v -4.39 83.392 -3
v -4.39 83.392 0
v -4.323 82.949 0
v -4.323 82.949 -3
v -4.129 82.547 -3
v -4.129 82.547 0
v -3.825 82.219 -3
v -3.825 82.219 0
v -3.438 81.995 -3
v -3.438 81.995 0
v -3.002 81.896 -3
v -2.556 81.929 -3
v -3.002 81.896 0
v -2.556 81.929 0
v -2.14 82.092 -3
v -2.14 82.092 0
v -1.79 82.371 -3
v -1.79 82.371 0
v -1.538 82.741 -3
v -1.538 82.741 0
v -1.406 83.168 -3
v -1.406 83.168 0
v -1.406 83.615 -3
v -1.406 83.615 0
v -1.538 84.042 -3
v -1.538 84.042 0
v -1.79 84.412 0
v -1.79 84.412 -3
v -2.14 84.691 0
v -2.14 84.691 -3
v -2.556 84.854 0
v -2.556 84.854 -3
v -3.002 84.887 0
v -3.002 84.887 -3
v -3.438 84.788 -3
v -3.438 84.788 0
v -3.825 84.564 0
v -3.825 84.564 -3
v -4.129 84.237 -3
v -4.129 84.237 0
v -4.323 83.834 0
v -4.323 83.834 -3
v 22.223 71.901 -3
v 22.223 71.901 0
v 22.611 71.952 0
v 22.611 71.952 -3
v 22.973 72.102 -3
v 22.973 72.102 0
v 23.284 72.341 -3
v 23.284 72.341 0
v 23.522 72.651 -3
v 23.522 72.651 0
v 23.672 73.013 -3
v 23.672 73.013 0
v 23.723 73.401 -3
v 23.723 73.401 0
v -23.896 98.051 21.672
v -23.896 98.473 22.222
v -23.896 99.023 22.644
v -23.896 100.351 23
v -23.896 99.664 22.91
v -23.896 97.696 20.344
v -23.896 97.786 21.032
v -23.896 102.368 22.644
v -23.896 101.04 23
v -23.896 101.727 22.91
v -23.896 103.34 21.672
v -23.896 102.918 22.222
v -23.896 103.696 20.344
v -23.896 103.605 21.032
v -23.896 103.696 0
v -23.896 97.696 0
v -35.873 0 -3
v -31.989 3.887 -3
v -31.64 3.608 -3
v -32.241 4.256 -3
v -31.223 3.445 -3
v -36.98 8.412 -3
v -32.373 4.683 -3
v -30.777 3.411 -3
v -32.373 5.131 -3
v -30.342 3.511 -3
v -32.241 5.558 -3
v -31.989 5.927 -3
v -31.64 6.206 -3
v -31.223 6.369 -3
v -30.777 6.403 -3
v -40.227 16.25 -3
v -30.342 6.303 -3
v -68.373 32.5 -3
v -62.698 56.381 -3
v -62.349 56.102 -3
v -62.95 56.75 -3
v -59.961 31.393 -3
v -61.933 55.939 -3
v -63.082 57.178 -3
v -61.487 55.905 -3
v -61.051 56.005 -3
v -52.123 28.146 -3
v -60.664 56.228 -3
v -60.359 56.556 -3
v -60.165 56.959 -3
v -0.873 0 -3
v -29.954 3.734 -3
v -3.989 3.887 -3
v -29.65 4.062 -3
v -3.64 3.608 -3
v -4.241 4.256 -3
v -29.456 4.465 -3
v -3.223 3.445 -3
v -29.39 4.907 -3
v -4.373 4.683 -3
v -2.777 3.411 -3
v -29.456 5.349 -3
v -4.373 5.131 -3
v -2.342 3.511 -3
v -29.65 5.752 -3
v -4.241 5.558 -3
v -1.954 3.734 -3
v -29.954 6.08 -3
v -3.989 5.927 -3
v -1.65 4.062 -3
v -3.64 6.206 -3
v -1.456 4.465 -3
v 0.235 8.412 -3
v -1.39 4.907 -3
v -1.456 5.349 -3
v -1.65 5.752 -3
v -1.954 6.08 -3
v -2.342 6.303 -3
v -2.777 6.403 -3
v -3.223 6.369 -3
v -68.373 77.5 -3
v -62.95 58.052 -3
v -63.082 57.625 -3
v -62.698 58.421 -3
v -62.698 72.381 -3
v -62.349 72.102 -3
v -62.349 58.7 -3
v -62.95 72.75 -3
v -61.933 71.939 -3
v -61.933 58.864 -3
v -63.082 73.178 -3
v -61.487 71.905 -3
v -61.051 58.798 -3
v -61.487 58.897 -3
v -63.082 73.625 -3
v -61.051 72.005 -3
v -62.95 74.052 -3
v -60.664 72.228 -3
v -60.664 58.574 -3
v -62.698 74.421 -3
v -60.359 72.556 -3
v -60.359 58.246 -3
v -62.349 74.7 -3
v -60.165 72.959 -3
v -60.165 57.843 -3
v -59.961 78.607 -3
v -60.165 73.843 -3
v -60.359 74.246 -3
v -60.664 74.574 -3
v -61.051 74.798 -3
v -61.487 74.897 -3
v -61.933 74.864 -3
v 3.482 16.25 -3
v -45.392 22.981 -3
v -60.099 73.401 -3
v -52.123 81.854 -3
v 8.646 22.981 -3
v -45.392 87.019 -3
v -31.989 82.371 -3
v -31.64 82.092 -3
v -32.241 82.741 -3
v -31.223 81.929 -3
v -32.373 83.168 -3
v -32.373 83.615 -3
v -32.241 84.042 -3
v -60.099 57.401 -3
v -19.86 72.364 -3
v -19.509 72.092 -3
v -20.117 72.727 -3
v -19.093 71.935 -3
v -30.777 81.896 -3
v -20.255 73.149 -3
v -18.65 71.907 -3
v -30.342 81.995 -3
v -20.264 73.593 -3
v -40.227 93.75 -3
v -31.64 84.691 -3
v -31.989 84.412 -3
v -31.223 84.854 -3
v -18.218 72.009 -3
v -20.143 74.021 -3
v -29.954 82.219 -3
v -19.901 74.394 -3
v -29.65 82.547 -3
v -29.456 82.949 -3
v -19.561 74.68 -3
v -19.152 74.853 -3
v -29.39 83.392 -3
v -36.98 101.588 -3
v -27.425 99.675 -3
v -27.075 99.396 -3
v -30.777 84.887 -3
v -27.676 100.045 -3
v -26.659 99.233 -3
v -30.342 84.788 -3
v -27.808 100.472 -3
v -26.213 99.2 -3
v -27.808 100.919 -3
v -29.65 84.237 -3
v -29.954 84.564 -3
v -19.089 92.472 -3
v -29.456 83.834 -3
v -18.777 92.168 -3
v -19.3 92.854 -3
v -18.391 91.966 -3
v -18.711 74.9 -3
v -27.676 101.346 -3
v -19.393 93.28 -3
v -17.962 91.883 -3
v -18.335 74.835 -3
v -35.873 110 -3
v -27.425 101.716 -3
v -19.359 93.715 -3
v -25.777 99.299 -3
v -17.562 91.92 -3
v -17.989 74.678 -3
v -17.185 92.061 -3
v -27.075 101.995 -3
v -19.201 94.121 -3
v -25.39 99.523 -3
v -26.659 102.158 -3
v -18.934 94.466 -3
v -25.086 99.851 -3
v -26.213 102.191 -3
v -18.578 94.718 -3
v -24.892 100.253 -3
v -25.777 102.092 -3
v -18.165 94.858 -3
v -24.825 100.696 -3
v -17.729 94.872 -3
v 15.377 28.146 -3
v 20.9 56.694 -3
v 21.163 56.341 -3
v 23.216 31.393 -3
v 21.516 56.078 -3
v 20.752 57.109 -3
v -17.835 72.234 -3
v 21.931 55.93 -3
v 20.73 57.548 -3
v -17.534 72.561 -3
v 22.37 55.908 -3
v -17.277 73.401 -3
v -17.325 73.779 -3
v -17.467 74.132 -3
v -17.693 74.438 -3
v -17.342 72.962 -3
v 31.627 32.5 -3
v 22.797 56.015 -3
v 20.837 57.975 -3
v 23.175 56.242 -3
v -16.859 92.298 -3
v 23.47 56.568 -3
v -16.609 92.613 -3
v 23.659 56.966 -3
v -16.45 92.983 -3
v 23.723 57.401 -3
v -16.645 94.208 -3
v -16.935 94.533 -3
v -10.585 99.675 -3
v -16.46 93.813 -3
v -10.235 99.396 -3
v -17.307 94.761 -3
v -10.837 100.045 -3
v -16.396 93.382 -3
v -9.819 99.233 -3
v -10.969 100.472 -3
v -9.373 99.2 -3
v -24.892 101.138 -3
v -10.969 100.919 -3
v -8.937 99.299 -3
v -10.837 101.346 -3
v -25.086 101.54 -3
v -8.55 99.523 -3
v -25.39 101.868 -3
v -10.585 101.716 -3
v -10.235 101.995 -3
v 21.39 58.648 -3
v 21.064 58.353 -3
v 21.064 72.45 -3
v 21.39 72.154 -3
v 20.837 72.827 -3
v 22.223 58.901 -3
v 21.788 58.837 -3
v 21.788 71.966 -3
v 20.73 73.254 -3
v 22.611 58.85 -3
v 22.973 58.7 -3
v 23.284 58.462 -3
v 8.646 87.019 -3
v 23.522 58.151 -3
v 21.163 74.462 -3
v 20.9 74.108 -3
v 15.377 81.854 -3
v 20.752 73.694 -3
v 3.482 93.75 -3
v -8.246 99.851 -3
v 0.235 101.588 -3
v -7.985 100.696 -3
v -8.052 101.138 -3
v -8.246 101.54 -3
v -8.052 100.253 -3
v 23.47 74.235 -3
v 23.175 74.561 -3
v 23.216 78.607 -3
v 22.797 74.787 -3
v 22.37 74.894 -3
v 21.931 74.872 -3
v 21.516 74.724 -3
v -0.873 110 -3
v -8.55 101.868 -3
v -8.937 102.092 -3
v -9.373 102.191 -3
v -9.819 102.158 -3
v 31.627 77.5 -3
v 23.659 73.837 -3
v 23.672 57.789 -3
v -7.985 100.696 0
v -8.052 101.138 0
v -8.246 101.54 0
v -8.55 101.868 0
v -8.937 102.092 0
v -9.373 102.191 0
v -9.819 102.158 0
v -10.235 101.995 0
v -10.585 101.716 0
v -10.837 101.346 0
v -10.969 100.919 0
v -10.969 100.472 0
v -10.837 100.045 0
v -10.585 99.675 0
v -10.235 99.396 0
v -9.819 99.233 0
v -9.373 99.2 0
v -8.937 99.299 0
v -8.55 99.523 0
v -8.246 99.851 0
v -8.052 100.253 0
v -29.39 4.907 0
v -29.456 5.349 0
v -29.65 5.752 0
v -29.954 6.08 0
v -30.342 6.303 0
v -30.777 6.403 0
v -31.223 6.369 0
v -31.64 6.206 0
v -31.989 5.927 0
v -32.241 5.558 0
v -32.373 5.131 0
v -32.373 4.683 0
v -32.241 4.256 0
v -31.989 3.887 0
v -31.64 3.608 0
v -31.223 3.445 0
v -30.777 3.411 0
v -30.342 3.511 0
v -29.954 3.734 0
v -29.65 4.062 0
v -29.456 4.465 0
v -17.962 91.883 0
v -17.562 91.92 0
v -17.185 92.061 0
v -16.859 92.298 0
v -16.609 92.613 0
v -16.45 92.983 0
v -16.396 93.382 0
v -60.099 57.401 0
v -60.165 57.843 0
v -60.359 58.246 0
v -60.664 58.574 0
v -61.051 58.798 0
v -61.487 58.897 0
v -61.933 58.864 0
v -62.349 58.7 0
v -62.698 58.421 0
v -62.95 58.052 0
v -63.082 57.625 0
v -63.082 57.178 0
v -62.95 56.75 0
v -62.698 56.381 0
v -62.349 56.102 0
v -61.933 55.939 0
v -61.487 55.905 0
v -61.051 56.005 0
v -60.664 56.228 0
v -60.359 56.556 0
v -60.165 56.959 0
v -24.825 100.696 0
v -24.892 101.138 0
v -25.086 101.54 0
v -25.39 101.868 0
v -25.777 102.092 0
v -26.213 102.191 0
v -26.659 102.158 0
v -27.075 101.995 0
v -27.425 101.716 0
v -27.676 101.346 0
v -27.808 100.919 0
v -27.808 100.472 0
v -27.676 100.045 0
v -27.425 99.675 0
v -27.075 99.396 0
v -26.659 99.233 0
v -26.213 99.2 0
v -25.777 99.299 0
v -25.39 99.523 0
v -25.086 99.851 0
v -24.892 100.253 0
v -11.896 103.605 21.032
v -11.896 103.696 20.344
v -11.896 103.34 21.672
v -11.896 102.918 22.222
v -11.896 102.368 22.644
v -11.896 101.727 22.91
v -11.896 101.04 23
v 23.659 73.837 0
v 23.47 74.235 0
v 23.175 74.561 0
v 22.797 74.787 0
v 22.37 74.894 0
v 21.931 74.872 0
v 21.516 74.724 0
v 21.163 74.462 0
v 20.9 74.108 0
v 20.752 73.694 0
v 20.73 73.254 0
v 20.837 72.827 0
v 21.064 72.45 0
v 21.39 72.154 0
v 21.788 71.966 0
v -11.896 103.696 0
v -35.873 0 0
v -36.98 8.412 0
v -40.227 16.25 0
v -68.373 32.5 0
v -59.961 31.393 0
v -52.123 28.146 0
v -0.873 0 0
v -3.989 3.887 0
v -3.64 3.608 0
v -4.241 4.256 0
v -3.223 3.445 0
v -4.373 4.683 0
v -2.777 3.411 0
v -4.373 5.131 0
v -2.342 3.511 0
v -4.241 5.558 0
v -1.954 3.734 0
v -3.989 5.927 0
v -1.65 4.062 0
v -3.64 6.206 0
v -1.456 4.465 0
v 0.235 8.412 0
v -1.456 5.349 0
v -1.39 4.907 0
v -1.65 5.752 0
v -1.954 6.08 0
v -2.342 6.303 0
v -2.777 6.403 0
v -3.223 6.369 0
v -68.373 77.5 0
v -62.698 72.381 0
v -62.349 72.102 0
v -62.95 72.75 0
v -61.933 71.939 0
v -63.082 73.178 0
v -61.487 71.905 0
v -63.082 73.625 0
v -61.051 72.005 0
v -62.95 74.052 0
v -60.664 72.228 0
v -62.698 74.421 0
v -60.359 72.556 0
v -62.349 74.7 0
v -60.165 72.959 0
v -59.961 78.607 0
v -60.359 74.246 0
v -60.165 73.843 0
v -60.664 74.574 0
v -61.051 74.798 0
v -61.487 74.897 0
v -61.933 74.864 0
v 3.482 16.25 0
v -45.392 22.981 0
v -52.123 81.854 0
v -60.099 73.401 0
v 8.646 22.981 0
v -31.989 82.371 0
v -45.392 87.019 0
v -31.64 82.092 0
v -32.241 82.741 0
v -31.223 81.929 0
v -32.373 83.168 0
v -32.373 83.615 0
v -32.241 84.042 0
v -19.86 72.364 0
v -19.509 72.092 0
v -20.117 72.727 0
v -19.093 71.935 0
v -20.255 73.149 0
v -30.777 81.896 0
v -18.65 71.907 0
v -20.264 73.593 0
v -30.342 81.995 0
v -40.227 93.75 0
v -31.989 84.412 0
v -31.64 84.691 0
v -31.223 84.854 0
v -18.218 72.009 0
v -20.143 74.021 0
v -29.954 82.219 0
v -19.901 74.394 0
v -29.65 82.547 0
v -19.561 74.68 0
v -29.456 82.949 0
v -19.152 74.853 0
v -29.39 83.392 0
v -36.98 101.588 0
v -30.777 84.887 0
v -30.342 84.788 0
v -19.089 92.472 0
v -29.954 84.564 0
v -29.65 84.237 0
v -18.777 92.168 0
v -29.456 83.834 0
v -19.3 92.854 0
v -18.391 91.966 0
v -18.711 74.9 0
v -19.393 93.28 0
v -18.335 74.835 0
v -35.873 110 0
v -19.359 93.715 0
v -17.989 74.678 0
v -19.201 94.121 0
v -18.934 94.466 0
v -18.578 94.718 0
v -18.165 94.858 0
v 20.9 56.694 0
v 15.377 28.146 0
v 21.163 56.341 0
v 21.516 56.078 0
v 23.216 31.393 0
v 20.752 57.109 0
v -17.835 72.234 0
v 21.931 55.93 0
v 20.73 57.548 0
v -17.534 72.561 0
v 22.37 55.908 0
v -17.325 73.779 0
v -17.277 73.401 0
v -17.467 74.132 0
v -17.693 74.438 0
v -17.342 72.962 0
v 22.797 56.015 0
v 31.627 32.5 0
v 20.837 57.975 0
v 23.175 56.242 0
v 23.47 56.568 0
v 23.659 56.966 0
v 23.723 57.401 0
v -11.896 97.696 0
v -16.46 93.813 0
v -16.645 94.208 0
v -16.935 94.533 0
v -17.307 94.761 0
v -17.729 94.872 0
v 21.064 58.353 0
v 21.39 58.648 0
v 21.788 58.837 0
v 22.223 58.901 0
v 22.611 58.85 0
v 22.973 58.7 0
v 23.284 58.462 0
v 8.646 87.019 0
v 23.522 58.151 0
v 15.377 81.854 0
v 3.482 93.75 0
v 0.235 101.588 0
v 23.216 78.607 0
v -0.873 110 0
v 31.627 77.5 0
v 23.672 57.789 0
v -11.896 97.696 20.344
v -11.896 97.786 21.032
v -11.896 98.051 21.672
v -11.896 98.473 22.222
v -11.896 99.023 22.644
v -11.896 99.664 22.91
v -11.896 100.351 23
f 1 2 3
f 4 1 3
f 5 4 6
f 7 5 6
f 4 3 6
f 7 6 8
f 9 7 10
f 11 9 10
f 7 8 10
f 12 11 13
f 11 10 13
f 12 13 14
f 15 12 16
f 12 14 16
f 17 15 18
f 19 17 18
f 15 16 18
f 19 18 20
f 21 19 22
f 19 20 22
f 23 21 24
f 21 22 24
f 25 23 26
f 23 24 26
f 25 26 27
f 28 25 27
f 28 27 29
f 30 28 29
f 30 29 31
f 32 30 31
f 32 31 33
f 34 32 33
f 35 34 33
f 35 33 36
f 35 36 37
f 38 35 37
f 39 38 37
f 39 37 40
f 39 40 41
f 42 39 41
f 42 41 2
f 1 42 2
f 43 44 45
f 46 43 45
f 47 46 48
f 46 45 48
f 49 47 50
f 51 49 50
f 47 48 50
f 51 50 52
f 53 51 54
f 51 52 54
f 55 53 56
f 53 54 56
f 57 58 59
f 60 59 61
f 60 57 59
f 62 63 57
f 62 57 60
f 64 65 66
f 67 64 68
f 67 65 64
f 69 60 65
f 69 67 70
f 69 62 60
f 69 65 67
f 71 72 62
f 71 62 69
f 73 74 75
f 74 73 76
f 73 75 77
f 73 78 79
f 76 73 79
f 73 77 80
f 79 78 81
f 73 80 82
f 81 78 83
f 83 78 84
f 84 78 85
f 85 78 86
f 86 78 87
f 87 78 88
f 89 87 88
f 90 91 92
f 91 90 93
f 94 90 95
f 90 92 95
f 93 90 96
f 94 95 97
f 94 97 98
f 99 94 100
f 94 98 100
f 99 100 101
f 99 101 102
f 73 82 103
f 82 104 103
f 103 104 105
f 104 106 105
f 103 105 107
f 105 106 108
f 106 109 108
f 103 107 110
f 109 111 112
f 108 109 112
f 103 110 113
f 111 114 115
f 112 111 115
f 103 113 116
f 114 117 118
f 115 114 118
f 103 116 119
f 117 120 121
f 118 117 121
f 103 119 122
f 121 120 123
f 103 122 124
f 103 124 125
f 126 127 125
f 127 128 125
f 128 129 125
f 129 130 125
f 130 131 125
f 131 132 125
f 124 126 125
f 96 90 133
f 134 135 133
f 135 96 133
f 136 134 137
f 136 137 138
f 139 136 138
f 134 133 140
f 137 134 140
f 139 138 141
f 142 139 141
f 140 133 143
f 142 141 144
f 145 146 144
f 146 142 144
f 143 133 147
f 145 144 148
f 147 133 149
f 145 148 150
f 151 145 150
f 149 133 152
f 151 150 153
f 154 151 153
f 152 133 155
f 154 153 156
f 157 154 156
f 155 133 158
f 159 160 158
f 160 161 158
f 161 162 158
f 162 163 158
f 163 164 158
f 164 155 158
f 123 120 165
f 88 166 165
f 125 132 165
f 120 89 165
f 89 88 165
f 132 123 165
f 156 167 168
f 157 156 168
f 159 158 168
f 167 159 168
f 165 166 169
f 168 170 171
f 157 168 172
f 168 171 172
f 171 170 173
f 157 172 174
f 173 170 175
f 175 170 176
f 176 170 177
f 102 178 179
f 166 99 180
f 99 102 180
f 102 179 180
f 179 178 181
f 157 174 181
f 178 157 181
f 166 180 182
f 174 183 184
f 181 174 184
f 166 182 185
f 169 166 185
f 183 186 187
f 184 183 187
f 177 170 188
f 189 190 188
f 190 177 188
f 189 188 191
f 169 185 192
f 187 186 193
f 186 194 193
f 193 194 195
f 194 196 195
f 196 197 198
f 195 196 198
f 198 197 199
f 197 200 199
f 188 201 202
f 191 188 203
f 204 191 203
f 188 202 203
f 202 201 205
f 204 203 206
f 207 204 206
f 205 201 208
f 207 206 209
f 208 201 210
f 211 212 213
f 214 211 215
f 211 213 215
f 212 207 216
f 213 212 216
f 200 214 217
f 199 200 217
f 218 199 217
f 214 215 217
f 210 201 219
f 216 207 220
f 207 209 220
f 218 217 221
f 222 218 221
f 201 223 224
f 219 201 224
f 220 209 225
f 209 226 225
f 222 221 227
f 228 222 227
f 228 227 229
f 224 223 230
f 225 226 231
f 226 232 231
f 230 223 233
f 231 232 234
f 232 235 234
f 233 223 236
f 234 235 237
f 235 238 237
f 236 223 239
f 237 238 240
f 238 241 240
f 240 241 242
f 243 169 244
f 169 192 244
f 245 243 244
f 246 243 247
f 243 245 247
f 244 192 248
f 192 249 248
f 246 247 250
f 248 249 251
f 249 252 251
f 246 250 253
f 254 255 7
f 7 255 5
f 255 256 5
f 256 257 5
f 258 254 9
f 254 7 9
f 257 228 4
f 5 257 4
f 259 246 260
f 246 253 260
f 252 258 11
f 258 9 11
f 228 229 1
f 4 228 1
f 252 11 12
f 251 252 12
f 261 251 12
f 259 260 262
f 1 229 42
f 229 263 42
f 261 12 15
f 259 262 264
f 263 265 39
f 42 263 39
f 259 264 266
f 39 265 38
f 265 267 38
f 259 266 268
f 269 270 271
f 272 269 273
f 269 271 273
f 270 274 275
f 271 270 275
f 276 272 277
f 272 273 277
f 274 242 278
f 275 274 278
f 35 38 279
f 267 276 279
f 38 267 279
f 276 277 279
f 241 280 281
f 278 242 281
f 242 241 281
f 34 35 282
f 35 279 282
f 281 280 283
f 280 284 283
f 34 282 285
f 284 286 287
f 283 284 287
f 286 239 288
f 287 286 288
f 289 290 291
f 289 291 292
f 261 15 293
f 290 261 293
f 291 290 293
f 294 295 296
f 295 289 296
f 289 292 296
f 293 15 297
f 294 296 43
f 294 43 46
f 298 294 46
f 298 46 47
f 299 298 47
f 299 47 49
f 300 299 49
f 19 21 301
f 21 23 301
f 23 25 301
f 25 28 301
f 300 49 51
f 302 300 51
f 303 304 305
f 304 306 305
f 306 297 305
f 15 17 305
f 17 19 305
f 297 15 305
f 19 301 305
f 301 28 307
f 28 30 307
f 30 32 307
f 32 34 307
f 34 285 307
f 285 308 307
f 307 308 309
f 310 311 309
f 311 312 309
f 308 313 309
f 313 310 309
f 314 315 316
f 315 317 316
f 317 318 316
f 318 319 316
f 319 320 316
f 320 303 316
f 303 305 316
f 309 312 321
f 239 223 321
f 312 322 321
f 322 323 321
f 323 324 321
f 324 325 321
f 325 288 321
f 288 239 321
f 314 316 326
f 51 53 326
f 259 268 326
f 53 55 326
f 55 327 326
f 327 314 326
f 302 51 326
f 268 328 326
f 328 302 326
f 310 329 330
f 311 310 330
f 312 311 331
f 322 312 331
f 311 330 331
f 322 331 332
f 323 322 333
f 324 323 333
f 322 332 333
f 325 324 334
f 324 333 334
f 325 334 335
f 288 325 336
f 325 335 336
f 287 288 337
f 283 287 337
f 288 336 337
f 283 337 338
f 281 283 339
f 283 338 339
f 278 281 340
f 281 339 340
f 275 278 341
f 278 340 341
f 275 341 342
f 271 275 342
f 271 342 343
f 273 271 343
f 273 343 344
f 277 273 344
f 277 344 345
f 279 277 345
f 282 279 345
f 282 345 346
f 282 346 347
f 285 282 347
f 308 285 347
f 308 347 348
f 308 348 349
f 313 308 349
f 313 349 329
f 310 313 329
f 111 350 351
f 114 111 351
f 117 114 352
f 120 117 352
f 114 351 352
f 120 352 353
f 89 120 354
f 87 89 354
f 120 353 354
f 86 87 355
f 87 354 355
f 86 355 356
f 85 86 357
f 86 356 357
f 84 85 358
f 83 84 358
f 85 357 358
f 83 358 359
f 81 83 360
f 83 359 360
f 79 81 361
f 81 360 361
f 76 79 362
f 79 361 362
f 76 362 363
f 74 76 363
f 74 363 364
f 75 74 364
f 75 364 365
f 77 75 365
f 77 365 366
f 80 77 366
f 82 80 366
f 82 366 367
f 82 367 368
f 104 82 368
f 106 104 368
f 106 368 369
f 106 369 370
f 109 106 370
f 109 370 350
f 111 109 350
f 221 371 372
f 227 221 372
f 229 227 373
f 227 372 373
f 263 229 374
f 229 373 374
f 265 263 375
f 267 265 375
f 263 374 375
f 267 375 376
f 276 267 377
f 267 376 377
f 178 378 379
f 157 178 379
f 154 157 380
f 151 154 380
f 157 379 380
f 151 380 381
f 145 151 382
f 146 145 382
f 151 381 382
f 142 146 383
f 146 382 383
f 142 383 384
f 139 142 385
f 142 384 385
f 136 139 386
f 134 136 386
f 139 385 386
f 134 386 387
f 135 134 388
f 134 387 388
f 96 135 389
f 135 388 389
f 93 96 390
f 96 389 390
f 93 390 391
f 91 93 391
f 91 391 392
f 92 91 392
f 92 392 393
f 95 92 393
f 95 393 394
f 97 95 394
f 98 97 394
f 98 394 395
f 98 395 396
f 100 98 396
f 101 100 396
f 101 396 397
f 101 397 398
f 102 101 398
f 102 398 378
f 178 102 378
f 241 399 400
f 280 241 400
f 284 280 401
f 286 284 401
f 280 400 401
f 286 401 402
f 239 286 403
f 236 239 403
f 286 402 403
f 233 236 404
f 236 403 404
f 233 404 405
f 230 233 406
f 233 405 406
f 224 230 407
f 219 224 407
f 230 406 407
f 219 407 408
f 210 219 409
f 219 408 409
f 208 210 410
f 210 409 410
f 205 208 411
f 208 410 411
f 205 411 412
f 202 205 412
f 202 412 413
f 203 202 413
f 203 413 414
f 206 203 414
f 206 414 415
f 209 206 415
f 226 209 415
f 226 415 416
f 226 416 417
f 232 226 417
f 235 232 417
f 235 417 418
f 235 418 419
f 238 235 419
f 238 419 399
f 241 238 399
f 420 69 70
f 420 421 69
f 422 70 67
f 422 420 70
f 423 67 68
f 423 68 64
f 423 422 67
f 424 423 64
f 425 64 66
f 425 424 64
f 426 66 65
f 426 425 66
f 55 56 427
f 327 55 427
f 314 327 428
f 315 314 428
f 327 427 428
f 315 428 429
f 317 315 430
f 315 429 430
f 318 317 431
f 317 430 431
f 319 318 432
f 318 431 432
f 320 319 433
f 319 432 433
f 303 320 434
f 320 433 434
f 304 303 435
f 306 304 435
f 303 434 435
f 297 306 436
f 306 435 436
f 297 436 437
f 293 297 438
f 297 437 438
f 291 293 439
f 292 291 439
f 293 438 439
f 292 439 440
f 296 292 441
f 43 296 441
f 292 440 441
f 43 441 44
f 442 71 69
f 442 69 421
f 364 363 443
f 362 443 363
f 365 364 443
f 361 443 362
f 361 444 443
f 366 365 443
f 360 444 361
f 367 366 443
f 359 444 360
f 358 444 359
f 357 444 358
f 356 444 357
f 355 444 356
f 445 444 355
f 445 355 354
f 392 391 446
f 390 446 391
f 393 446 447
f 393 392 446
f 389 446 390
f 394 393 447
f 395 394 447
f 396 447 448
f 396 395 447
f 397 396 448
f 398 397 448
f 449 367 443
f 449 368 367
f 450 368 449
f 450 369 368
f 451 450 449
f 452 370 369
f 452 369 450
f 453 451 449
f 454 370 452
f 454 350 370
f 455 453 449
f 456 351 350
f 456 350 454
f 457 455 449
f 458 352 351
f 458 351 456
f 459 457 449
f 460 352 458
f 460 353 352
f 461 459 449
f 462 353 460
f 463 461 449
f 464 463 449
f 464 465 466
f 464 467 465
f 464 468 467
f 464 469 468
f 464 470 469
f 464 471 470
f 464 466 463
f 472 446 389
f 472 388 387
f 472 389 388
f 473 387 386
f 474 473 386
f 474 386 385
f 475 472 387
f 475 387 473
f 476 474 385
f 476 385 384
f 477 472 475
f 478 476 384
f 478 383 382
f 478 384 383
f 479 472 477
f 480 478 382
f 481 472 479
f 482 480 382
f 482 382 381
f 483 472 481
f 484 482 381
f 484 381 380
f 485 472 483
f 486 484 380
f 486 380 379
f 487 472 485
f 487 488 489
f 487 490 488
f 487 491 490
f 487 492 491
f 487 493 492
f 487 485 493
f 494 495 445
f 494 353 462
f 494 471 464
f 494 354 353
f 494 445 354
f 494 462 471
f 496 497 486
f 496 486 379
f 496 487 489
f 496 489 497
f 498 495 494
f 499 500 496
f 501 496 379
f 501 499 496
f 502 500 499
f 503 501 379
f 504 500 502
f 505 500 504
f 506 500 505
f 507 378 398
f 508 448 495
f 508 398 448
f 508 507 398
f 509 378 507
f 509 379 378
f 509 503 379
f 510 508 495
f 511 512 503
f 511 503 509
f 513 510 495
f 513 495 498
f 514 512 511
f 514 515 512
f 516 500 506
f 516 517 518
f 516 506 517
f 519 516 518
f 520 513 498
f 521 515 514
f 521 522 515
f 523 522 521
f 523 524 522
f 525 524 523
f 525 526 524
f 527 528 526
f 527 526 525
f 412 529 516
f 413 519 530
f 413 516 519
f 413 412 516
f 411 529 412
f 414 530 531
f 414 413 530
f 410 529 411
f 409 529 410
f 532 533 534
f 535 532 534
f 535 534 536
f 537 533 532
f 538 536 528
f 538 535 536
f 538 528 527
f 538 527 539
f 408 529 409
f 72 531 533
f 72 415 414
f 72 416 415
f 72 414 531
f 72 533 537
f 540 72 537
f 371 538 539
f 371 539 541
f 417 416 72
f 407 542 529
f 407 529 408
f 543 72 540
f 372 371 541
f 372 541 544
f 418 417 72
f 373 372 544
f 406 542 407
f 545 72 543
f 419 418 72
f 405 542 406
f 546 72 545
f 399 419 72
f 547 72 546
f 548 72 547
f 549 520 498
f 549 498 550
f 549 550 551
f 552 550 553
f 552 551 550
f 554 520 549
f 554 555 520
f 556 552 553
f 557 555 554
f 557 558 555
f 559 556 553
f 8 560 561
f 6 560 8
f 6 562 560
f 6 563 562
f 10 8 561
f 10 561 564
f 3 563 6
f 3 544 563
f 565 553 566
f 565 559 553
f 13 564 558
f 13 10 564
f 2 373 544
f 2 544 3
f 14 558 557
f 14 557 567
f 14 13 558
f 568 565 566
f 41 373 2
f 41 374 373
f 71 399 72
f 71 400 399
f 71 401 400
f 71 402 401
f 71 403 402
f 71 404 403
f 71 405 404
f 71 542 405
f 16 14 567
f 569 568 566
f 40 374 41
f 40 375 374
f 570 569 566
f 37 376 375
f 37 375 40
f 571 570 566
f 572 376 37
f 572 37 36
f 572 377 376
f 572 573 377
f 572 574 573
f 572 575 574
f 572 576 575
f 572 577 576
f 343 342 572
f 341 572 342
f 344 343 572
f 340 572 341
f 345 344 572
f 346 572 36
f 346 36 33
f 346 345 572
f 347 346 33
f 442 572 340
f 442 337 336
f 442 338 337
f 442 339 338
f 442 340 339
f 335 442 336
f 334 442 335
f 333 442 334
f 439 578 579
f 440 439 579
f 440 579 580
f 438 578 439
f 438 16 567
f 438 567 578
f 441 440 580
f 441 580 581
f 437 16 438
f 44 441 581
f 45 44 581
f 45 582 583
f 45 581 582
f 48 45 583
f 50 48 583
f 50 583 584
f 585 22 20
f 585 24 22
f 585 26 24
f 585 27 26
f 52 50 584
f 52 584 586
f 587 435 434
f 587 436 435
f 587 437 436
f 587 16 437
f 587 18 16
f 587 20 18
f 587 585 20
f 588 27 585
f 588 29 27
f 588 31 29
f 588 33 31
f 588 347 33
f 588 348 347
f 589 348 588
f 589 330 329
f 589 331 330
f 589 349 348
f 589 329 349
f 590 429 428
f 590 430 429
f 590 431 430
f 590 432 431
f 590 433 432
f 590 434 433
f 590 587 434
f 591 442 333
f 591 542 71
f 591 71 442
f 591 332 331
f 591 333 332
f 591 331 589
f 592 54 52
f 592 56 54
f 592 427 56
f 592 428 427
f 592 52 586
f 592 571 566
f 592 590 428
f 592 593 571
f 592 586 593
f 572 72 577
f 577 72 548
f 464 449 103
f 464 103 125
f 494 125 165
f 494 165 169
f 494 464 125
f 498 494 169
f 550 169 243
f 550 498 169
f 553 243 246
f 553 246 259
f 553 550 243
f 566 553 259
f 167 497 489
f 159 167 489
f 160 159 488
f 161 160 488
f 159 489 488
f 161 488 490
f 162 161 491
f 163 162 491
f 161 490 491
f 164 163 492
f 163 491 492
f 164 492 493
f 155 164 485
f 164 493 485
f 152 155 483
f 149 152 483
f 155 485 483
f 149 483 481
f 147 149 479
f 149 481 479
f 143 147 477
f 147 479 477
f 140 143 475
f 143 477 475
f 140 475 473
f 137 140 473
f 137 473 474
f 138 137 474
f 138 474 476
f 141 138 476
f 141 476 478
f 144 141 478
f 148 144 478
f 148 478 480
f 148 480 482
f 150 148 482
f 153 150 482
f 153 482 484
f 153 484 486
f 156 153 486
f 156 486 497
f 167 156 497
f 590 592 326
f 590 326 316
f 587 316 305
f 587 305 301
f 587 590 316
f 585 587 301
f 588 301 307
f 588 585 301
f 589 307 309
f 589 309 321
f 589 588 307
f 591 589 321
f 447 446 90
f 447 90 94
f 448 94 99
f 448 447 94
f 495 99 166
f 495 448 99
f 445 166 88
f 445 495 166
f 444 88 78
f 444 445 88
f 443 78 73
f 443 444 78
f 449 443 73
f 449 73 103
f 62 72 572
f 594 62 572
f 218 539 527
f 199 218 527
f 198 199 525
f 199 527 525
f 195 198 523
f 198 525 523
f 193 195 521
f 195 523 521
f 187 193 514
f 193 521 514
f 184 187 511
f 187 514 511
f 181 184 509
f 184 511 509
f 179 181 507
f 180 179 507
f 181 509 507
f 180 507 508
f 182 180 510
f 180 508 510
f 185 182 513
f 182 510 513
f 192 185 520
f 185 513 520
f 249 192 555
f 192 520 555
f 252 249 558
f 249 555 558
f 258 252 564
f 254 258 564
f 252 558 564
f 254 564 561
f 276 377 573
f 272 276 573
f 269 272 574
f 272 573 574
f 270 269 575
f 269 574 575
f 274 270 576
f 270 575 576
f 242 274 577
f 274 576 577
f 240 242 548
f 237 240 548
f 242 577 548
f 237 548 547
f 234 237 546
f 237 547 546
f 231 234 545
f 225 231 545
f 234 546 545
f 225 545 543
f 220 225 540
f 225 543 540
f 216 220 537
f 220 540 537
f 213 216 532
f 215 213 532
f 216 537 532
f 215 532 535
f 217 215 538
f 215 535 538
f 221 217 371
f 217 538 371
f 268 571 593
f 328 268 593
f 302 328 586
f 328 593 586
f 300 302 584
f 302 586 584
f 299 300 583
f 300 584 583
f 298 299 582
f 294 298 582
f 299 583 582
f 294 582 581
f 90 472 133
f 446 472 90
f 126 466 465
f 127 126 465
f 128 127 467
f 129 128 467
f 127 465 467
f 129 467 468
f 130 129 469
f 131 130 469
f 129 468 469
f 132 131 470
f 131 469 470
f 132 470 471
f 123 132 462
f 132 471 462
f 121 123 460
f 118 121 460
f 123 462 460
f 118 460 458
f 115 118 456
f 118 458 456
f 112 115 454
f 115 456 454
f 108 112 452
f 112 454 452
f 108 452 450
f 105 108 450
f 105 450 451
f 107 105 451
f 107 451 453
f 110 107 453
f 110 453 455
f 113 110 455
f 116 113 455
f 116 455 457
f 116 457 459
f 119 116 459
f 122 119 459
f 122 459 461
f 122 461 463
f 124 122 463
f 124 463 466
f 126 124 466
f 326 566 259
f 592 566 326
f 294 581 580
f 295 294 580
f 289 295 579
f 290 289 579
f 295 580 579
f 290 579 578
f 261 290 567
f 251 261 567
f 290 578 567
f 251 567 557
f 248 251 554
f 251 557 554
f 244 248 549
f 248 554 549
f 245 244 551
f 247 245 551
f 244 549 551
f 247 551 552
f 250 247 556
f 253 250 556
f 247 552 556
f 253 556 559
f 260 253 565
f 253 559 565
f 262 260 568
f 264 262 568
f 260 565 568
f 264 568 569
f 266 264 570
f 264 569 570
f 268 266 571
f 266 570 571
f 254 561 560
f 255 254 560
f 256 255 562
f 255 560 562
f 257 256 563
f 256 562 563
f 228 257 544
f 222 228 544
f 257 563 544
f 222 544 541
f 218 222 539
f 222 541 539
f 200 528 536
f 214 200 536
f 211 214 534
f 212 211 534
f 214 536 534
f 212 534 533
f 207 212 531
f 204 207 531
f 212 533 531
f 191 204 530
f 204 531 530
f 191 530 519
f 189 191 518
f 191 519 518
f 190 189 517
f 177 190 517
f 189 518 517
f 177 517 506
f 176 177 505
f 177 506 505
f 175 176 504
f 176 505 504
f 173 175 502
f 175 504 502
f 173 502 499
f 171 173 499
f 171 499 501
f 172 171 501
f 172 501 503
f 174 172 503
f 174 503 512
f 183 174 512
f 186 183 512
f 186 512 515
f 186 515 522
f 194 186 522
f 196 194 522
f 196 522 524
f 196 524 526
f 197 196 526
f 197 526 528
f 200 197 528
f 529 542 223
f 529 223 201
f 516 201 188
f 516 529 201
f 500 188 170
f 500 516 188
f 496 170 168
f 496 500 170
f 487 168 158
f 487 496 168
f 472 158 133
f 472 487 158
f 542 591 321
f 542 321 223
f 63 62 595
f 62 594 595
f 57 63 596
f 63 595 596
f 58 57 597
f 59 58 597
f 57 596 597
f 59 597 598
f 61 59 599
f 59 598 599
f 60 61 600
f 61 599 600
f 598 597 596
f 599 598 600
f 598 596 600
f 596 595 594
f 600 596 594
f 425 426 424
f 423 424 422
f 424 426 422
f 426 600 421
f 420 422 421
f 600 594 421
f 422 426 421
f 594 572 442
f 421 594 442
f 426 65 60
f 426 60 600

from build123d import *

# Parameters (mm, degrees)
F1_DEPTH = 3
F2_W     = 12
F2_H     = 6
F3_DEPTH = 23
F4_R     = 2.6556349186
F5_R     = 1.5
F6_DEPTH = 25


with BuildPart() as f1:
    # F0 (on Top) → F1 (new body)
    with BuildSketch(Plane.XY):
        with BuildLine():
            Line((-0.8725353895, 110), (-35.8725353895, 110))
            ThreePointArc((-35.8725353895, 110), (-45.391565001, 87.0190296114), (-68.3725353895, 77.5))
            Line((-68.3725353895, 77.5), (-68.3725353895, 32.5))
            ThreePointArc((-68.3725353895, 32.5), (-45.391565001, 22.9809703886), (-35.8725353895, 0))
            Line((-35.8725353895, 0), (-0.8725353895, 0))
            ThreePointArc((-0.8725353895, 0), (8.6464942219, 22.9809703886), (31.6274646105, 32.5))
            Line((31.6274646105, 32.5), (31.6274646105, 77.5))
            ThreePointArc((31.6274646105, 77.5), (8.6464942219, 87.0190296114), (-0.8725353895, 110))
        make_face()
    extrude(amount=-F1_DEPTH)

    # F2 (on face) → F3 (join)
    with BuildSketch(Plane.XY):
        with Locations((-17.8964557126, 100.6955172337)):
            Rectangle(F2_W, F2_H)
    extrude(amount=F3_DEPTH)

    # F4
    f4_edges = [f1.edges().sort_by_distance(p)[0] for p in [
        (-17.896456, 103.695517, 23),
        (-17.896456, 97.695517, 23),
    ]]
    fillet(f4_edges, radius=F4_R)

    # F5 (on face) → F6 (cut)
    with BuildSketch(Plane.XY):
        with Locations((-9.4853062183, 100.6955172337)):
            Circle(F5_R)
        with Locations((-26.3249855489, 100.6955172337)):
            Circle(F5_R)
        with BuildLine():
            ThreePointArc((-17.9624670977, 91.8832976659), (-16.8593966684, 92.2980970094), (-16.3964557126, 93.381844461))
            ThreePointArc((-16.3964557126, 93.381844461), (-18.9335147568, 94.4655919126), (-17.9624670977, 91.8832976659))
        make_face()
        with BuildLine():
            ThreePointArc((-1.3895297348, 83.3915324938), (-2.8895297348, 84.8915324938), (-4.3895297348, 83.3915324938))
            ThreePointArc((-4.3895297348, 83.3915324938), (-2.8895297348, 81.8915324938), (-1.3895297348, 83.3915324938))
        make_face()
        with BuildLine():
            ThreePointArc((-17.2766075142, 73.4012205266), (-17.6928600626, 74.4382795708), (-18.7105961291, 74.8997673217))
            ThreePointArc((-18.7105961291, 74.8997673217), (-19.8603549658, 72.3641614824), (-17.2766075142, 73.4012205266))
        make_face()
        with Locations((-30.8895297348, 83.3915324938)):
            Circle(F5_R)
        with BuildLine():
            ThreePointArc((22.2231764346, 71.9012205266), (23.2838366064, 72.3405603548), (23.7231764346, 73.4012205266))
            ThreePointArc((23.7231764346, 73.4012205266), (21.1625162629, 74.4618806984), (22.2231764346, 71.9012205266))
        make_face()
        with BuildLine():
            ThreePointArc((23.7231764346, 57.4012205266), (23.2838366064, 58.4618806984), (22.2231764346, 58.9012205266))
            ThreePointArc((22.2231764346, 58.9012205266), (21.1625162629, 56.3405603548), (23.7231764346, 57.4012205266))
        make_face()
        with Locations((-61.5987628698, 73.4012205266)):
            Circle(F5_R)
        with Locations((-61.5987628698, 57.4012205266)):
            Circle(F5_R)
        with Locations((-2.8895297348, 4.9070445821)):
            Circle(F5_R)
        with Locations((-30.8895297348, 4.9070445821)):
            Circle(F5_R)
    extrude(amount=-F6_DEPTH, mode=Mode.SUBTRACT)


solid = f1.part
